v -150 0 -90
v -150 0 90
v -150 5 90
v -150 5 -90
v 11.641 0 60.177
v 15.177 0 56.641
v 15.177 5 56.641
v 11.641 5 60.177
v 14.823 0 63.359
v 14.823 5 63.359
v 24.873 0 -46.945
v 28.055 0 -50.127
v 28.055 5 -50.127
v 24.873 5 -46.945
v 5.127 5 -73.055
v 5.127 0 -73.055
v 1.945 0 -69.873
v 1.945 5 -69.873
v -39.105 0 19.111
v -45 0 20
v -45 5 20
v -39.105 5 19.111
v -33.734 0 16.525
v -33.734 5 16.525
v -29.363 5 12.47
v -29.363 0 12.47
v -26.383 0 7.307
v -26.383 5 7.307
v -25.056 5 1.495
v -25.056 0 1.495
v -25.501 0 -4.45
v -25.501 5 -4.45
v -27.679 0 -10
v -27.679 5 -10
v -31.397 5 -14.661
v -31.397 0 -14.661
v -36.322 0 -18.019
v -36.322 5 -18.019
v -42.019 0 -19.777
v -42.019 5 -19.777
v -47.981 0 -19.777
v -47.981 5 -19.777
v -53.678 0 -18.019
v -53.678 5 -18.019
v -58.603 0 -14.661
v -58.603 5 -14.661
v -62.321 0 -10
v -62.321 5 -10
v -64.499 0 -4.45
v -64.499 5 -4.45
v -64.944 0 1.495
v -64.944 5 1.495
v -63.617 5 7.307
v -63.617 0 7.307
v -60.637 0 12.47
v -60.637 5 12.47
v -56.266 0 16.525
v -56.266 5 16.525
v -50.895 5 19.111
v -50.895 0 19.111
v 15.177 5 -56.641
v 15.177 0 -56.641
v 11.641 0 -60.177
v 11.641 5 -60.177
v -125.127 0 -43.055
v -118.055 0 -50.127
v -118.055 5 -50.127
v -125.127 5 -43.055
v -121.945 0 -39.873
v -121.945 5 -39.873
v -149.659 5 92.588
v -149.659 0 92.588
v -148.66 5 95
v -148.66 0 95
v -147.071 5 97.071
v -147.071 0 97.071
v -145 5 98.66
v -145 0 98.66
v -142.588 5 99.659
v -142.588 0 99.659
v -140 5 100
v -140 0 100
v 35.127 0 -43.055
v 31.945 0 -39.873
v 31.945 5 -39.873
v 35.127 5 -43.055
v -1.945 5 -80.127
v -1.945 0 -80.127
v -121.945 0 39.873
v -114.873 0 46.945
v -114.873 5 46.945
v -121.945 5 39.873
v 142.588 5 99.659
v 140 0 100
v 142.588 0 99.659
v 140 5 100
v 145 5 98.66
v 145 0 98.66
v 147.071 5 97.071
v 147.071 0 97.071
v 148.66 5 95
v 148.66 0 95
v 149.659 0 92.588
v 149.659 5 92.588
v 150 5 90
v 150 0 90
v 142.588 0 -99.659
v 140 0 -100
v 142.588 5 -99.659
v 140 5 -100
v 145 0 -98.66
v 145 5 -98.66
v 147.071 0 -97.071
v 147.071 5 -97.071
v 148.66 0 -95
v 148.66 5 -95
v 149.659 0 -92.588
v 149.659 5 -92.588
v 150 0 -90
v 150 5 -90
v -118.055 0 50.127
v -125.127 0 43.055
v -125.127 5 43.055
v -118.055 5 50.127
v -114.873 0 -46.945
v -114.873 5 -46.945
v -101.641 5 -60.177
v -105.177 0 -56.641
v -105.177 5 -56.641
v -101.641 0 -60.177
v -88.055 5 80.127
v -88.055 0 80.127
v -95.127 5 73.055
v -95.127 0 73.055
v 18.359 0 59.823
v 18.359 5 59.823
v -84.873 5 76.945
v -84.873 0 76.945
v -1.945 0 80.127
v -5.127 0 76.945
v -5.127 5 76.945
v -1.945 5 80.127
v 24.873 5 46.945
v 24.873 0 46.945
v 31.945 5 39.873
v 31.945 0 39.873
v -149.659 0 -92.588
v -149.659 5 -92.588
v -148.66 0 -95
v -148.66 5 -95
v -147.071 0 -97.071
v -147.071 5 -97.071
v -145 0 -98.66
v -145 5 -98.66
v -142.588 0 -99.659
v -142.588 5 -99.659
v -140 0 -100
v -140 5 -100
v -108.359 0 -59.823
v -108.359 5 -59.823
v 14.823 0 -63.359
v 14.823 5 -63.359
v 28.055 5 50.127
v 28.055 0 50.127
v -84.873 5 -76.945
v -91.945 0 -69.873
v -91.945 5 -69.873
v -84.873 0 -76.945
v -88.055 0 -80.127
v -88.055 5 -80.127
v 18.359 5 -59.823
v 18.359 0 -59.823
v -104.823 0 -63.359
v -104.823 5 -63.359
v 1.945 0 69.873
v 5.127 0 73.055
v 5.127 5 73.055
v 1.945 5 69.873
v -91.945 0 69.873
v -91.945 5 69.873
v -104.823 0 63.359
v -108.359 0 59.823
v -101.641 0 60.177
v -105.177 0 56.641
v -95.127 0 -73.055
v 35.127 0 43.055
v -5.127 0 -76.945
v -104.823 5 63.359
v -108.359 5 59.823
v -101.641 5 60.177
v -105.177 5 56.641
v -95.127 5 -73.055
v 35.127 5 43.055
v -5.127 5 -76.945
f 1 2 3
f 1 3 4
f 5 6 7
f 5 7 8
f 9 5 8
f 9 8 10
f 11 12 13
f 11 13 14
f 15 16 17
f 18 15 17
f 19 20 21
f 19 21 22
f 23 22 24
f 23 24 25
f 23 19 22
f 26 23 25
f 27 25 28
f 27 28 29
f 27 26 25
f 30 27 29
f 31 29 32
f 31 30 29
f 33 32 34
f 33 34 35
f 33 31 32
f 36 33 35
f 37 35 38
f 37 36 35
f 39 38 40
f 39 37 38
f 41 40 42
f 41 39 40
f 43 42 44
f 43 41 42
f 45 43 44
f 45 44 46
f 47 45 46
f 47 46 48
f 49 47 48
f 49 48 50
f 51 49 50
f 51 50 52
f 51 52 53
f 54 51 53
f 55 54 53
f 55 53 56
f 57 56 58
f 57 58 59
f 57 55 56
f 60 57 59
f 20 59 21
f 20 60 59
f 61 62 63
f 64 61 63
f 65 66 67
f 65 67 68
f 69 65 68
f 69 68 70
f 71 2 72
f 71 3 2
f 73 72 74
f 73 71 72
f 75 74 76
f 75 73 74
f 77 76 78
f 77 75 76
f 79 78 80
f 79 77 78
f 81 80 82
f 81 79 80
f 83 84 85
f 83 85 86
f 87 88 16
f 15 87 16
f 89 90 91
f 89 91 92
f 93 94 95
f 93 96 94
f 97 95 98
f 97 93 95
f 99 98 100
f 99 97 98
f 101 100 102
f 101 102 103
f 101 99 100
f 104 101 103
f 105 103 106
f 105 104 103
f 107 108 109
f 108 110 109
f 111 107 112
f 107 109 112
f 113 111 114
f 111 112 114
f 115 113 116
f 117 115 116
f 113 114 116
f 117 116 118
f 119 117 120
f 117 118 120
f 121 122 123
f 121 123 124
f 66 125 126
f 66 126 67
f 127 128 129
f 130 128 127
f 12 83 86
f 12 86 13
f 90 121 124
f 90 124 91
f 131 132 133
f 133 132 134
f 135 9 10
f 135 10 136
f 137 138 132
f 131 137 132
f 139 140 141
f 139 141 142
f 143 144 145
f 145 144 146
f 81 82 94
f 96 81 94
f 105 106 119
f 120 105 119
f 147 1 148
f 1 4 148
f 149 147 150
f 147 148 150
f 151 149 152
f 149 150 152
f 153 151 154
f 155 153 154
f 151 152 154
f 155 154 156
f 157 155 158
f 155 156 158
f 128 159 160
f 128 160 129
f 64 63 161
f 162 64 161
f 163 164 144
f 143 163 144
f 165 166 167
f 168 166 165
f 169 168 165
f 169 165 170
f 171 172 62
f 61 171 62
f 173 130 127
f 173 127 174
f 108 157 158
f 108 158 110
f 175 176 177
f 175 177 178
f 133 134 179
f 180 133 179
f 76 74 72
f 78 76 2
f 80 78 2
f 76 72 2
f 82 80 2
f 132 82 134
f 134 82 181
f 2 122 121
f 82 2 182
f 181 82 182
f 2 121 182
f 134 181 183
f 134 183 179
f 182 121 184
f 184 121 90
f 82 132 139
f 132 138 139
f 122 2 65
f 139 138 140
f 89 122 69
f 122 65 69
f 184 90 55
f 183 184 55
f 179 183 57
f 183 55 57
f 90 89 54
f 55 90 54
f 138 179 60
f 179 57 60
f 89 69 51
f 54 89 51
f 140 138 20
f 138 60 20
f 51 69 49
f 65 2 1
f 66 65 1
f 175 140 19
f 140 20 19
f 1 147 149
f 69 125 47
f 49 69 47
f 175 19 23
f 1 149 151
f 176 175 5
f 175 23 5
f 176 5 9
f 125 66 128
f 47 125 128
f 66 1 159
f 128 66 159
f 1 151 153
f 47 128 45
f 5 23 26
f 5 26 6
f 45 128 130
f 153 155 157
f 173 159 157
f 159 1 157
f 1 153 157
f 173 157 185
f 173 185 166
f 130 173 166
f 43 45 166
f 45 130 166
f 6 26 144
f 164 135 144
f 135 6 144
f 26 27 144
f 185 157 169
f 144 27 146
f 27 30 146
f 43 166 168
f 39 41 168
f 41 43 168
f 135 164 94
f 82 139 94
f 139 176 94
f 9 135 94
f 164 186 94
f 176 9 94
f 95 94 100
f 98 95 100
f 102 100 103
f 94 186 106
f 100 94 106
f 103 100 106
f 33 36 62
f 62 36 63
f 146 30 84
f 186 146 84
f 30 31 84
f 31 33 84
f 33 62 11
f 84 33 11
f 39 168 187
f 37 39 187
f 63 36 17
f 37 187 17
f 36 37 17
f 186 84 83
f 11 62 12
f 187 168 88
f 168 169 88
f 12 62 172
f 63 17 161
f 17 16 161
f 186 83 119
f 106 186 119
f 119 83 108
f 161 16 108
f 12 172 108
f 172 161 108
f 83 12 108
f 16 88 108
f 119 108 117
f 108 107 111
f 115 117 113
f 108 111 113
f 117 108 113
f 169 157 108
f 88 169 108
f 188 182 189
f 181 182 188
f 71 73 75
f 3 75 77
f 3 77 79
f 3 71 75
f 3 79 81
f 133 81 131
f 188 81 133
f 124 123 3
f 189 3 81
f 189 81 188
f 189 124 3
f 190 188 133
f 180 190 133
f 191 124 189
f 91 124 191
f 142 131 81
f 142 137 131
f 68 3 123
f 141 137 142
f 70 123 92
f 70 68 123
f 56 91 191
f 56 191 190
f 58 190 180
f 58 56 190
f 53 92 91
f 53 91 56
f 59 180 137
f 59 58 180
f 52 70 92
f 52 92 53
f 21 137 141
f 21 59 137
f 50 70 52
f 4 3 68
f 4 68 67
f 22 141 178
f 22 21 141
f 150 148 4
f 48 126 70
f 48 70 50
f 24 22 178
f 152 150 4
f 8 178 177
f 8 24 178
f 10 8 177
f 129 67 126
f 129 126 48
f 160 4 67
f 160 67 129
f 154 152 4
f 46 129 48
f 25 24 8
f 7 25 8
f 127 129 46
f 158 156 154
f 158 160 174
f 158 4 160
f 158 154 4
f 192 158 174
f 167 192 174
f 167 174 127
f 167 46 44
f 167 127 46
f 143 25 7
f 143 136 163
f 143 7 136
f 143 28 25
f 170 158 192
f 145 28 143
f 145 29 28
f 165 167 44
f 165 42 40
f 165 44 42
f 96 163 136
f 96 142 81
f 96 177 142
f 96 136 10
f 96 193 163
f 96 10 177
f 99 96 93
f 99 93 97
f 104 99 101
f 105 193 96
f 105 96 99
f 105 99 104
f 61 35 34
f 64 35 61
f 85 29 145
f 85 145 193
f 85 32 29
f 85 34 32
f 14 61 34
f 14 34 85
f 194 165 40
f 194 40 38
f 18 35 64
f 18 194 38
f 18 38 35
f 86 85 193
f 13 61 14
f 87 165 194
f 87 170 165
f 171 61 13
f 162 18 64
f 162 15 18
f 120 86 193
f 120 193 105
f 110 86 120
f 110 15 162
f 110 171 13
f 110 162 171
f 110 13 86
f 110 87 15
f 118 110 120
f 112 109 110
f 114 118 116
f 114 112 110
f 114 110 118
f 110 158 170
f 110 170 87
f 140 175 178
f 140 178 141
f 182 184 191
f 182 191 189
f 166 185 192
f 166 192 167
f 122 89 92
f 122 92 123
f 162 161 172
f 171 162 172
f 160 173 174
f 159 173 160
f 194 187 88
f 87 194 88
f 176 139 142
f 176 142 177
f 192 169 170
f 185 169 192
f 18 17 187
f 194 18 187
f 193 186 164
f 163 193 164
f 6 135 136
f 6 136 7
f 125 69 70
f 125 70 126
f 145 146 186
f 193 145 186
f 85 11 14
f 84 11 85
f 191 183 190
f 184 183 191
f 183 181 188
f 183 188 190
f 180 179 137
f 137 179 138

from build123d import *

# Parameters (mm, degrees)
SKETCH1_W           = 300
SKETCH1_H           = 200
SKETCH1_R           = 20
BOSS_EXTRUDE2_DEPTH = 5
FILLET1_R           = 10


with BuildPart() as part:
    # Sketch1 → Boss-Extrude2 (new body)
    with BuildSketch(Plane(origin=(0, 0, 0), x_dir=(1, 0, 0), z_dir=(0, 1, 0))):
        Rectangle(SKETCH1_W, SKETCH1_H)
        with Locations(Location((-45, 0, 0), (0, 0, 270))):
            Circle(SKETCH1_R, mode=Mode.SUBTRACT)
        Polygon((-88.055456352, 80.126524164), (-95.126524164, 73.055456352), (-91.944543648, 69.873475836), (-84.873475836, 76.944543648), align=None, mode=Mode.SUBTRACT)
        Polygon((-121.944543648, 39.873475836), (-114.873475836, 46.944543648), (-118.055456352, 50.126524164), (-125.126524164, 43.055456352), align=None, mode=Mode.SUBTRACT)
        Polygon((-1.944543648, 80.126524164), (5.126524164, 73.055456352), (1.944543648, 69.873475836), (-5.126524164, 76.944543648), align=None, mode=Mode.SUBTRACT)
        Polygon((35.126524164, 43.055456352), (28.055456352, 50.126524164), (24.873475836, 46.944543648), (31.944543648, 39.873475836), align=None, mode=Mode.SUBTRACT)
        Polygon((-1.944543648, -80.126524164), (5.126524164, -73.055456352), (1.944543648, -69.873475836), (-5.126524164, -76.944543648), align=None, mode=Mode.SUBTRACT)
        Polygon((35.126524164, -43.055456352), (28.055456352, -50.126524164), (24.873475836, -46.944543648), (31.944543648, -39.873475836), align=None, mode=Mode.SUBTRACT)
        Polygon((-125.126524164, -43.055456352), (-118.055456352, -50.126524164), (-114.873475836, -46.944543648), (-121.944543648, -39.873475836), align=None, mode=Mode.SUBTRACT)
        Polygon((-88.055456352, -80.126524164), (-95.126524164, -73.055456352), (-91.944543648, -69.873475836), (-84.873475836, -76.944543648), align=None, mode=Mode.SUBTRACT)
        Polygon((15.176776695, 56.641242789), (11.641242789, 60.176776695), (14.823223305, 63.358757211), (18.358757211, 59.823223305), align=None, mode=Mode.SUBTRACT)
        Polygon((15.176776695, -56.641242789), (11.641242789, -60.176776695), (14.823223305, -63.358757211), (18.358757211, -59.823223305), align=None, mode=Mode.SUBTRACT)
        Polygon((-101.641242789, -60.176776695), (-105.176776695, -56.641242789), (-108.358757211, -59.823223305), (-104.823223305, -63.358757211), align=None, mode=Mode.SUBTRACT)
        Polygon((-105.176776695, 56.641242789), (-101.641242789, 60.176776695), (-104.823223305, 63.358757211), (-108.358757211, 59.823223305), align=None, mode=Mode.SUBTRACT)
    extrude(amount=BOSS_EXTRUDE2_DEPTH)

    # Fillet1
    fillet1_edges = [part.edges().sort_by_distance(p)[0] for p in [
        (-150, 2.5, -100),
        (150, 2.5, -100),
        (150, 2.5, 100),
        (-150, 2.5, 100),
    ]]
    fillet(fillet1_edges, radius=FILLET1_R)


solid = part.part
